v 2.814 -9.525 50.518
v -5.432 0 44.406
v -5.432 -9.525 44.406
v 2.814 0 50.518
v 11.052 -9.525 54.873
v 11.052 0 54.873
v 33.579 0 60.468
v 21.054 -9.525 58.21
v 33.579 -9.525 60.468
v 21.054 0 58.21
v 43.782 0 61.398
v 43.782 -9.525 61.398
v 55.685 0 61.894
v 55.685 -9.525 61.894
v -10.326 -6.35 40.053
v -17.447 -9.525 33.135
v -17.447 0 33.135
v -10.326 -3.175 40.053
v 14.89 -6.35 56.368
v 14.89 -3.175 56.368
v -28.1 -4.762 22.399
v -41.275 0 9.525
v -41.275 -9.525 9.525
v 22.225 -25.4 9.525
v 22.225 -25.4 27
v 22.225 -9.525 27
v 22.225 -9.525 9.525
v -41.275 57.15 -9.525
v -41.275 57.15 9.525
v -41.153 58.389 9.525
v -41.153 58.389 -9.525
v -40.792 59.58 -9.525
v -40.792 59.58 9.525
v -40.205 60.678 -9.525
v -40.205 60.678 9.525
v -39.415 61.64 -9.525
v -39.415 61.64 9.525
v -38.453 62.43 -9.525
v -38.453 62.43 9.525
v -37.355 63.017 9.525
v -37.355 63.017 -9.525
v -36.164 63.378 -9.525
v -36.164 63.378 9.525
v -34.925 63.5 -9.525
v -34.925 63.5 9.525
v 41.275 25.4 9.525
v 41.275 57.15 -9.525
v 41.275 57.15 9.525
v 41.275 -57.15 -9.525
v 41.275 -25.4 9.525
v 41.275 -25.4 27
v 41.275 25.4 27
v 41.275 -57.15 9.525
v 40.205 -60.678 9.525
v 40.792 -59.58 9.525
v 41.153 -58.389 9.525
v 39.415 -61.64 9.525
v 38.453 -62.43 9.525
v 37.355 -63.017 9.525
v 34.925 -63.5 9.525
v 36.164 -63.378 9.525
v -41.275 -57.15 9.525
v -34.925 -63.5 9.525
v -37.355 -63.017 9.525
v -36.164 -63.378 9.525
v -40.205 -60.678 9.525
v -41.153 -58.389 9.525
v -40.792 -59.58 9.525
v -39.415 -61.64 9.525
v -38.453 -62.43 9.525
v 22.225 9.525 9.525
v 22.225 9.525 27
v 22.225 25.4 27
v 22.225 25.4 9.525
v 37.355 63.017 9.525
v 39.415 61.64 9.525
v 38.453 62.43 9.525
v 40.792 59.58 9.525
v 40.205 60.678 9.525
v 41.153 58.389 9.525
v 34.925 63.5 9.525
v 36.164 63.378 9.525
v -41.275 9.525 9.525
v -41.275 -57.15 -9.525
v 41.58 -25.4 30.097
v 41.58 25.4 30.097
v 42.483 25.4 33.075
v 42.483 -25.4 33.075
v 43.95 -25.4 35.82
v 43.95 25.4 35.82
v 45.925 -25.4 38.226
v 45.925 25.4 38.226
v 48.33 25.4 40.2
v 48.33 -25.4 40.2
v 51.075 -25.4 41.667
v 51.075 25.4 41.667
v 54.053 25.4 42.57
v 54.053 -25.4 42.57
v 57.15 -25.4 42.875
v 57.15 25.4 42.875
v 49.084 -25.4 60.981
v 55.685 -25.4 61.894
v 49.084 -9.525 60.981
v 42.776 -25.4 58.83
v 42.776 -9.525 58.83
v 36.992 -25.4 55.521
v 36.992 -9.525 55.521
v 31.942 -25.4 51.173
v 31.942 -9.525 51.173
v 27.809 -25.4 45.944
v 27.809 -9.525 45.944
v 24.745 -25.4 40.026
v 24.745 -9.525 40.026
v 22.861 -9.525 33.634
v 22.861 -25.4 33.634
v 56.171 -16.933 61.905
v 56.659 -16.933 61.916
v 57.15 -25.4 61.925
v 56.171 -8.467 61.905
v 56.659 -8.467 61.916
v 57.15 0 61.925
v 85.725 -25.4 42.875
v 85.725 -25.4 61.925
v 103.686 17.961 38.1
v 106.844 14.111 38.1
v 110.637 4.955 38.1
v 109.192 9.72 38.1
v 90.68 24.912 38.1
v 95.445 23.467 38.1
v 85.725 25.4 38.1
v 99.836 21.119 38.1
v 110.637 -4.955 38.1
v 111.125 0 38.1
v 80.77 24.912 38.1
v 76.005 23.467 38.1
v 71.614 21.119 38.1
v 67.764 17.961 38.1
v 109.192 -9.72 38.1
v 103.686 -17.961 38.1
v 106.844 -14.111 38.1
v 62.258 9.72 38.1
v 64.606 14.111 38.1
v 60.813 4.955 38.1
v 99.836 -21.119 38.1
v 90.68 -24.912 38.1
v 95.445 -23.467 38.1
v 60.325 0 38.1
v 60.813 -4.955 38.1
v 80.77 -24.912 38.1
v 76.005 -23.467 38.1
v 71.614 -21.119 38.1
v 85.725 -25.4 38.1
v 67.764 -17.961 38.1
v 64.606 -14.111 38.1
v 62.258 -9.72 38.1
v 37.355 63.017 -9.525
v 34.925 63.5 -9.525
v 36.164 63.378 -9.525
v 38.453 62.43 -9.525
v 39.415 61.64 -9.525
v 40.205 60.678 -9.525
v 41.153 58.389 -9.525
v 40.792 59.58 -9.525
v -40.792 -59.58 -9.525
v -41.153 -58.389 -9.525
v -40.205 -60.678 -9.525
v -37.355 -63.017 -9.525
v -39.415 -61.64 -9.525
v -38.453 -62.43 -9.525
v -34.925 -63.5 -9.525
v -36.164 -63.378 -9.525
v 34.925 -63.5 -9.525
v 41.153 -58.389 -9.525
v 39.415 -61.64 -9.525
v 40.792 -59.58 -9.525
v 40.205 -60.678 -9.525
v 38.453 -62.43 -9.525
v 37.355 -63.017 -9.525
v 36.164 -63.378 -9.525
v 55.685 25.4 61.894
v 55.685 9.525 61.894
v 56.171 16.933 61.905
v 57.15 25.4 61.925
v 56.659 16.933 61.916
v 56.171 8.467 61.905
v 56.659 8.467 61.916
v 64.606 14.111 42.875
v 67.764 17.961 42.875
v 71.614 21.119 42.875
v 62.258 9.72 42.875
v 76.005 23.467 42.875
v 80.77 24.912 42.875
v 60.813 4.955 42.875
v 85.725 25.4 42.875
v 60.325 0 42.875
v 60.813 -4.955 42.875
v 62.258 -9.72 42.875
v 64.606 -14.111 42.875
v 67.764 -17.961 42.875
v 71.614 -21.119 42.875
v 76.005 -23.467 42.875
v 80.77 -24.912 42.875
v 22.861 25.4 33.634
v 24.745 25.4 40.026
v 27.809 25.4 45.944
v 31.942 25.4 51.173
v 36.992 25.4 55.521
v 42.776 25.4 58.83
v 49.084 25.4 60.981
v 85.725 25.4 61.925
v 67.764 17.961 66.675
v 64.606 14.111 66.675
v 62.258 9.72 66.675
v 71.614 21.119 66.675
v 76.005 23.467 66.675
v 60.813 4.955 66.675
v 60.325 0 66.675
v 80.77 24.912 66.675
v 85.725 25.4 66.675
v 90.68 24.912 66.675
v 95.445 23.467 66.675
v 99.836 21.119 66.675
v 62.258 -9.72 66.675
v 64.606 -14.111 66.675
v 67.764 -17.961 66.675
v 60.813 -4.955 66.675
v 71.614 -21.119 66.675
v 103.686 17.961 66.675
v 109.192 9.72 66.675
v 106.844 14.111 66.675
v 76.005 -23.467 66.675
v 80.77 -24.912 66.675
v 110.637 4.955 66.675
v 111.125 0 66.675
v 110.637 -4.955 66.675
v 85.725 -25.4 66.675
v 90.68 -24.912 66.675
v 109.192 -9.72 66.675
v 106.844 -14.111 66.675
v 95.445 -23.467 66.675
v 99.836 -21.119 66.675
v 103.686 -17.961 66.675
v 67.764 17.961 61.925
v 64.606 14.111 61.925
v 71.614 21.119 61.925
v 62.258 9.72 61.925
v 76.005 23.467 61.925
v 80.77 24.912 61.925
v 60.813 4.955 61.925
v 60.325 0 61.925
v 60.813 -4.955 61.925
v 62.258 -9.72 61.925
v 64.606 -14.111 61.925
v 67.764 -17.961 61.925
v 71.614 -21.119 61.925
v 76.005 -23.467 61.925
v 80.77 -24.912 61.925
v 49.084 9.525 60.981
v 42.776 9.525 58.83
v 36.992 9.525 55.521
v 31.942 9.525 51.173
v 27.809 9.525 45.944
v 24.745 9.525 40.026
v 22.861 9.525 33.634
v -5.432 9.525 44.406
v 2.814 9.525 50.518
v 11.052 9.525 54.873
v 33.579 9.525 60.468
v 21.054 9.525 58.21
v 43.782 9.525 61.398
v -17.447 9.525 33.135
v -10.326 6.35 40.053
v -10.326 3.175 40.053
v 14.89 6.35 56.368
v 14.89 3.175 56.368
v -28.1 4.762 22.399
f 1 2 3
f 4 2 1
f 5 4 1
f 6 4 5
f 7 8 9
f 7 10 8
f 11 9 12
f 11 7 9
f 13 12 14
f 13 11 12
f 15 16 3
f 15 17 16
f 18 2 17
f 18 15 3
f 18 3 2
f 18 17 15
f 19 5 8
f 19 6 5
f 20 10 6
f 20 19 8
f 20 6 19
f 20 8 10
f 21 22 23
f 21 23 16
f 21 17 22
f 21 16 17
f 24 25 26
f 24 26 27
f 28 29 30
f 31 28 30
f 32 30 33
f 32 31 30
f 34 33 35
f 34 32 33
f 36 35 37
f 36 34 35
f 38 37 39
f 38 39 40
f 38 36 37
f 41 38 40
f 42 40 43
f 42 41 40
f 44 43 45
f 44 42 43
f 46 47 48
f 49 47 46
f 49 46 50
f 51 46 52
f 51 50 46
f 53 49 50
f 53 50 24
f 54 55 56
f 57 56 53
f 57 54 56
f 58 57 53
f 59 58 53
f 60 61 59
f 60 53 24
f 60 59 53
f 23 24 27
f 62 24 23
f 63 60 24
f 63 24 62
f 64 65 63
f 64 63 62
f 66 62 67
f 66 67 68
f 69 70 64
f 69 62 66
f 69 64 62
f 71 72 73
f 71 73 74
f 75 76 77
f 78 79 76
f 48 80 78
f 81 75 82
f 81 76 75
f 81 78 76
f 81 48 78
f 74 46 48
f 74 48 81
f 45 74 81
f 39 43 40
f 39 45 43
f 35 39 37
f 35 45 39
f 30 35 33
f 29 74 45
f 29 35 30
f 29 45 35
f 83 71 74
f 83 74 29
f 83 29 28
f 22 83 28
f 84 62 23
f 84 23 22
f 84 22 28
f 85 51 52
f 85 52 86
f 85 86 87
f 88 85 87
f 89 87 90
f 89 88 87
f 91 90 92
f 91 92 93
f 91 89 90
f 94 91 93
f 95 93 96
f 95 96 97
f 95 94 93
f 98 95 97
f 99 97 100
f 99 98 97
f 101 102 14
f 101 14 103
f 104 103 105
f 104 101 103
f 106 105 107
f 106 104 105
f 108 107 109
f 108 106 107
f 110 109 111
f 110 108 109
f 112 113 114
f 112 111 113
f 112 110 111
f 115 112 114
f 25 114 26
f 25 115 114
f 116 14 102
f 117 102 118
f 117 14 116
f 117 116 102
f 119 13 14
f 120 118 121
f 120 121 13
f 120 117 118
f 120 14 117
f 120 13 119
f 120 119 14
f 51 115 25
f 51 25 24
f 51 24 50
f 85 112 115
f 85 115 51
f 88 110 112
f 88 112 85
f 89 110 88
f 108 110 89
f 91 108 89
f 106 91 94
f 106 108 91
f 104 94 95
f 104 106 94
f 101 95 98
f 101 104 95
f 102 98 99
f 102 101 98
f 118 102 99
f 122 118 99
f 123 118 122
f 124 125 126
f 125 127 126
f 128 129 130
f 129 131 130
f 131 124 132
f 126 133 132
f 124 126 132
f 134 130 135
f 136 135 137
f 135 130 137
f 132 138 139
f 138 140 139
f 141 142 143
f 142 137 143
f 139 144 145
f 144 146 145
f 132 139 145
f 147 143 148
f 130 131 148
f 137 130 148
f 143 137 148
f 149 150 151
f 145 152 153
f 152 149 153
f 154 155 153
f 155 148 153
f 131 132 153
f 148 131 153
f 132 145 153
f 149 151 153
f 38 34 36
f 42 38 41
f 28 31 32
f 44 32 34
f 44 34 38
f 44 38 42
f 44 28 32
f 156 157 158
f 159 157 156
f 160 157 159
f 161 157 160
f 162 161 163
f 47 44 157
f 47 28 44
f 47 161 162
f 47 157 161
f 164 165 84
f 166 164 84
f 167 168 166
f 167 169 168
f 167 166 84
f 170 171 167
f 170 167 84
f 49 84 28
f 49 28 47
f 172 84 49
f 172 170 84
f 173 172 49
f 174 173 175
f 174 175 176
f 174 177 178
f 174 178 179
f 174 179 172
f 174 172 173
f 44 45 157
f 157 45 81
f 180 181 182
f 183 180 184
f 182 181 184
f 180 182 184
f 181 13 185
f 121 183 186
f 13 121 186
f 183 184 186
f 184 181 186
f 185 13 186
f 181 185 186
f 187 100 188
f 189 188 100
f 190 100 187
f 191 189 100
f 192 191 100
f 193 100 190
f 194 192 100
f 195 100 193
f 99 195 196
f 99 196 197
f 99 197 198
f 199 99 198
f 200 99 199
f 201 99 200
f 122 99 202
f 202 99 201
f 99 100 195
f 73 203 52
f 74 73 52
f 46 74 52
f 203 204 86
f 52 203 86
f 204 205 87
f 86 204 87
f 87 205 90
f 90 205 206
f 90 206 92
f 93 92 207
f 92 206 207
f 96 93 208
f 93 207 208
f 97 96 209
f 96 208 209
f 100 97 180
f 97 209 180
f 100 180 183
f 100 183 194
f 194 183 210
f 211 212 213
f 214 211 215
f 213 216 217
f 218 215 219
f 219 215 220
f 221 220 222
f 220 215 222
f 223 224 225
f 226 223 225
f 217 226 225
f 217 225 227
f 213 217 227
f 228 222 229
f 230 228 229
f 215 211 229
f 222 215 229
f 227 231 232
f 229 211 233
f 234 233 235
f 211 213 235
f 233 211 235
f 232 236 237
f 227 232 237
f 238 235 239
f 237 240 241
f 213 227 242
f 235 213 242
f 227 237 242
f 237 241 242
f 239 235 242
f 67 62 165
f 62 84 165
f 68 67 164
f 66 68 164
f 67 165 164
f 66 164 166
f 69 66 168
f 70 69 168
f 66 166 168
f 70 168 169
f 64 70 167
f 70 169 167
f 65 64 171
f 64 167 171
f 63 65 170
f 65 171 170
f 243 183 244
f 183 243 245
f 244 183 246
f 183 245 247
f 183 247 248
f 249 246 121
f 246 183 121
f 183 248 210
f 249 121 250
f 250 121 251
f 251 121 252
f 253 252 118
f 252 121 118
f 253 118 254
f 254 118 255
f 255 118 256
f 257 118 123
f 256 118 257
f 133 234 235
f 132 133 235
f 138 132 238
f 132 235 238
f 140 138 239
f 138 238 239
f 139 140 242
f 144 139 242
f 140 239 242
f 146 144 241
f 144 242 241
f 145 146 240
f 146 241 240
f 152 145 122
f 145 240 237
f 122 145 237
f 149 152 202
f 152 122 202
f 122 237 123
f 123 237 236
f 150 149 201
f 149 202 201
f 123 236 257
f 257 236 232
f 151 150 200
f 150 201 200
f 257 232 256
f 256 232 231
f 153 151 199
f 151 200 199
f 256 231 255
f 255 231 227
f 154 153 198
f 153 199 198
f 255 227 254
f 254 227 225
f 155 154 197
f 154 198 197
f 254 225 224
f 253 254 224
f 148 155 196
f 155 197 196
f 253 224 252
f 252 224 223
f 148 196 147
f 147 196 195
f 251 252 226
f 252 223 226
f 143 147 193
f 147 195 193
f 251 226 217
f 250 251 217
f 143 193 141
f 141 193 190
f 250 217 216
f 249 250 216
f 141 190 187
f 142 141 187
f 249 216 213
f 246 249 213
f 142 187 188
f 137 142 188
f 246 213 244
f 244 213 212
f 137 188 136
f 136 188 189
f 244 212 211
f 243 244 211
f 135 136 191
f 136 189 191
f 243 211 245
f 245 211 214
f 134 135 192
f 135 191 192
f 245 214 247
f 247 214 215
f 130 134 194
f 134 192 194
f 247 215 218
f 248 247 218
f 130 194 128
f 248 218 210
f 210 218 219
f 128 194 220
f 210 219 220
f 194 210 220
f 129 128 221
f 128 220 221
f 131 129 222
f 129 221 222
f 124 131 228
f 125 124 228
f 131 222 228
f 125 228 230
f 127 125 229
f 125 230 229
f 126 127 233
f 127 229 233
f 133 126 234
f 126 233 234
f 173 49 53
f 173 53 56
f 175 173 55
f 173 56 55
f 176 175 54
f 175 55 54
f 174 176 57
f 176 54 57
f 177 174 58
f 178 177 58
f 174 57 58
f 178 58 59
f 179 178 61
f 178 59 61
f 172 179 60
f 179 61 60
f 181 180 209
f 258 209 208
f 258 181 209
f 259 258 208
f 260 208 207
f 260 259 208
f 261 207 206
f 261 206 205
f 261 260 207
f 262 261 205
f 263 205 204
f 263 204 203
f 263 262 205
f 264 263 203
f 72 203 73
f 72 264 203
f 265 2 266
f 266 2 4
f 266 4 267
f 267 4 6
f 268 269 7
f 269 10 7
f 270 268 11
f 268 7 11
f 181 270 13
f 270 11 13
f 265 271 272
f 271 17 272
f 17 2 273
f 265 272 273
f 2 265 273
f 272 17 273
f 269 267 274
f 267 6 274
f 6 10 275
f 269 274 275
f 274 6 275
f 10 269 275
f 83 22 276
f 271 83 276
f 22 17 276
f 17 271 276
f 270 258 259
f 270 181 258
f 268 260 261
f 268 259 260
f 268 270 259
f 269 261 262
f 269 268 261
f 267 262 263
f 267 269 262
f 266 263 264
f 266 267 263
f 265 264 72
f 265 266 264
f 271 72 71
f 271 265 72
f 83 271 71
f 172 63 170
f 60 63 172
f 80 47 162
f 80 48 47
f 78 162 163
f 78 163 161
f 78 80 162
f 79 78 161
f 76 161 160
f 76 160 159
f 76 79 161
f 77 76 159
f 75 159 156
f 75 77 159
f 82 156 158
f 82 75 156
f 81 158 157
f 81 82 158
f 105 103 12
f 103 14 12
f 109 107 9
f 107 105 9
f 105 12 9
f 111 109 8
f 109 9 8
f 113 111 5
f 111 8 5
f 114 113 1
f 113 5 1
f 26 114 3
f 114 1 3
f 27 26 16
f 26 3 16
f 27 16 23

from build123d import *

# Parameters (mm, degrees)
F1_DEPTH = 63.5
F2_DEPTH = 25.4
F3_DEPTH = 9.525
F0_W     = 25.4
F0_H     = 19.05
F4_DEPTH = 25.4
F6_R     = 6.35


# Not quite as in the source:
# - a feature names something its author has since deleted; it is built from what else it names


with BuildPart() as f1:
    # F0 (on Front) → F1 (new body, symmetric)
    with BuildSketch(Plane.XZ):
        Polygon((22.225, 9.525), (-41.275, 9.525), (-41.275, -9.525), (41.275, -9.525), (41.275, 9.525), align=None)
    extrude(amount=F1_DEPTH, both=True)

    # F0 (on Front) → F2 (join, symmetric)
    with BuildSketch(Plane.XZ):
        with BuildLine():
            Line((22.225, 27.0002), (22.225, 9.525))
            Line((22.225, 9.525), (41.275, 9.525))
            Line((41.275, 9.525), (41.275, 27.0002))
            ThreePointArc((41.275, 27.0002), (45.9246798487, 38.2255201513), (57.15, 42.8752))
            Line((57.15, 42.8752), (60.325, 42.8752))
            Line((60.325, 42.8752), (60.325, 61.9252))
            Line((60.325, 61.9252), (57.15, 61.9252))
            add(Edge.make_bspline(
                [(55.6853928695, 61.894476765), (56.1693943217, 61.9055488515), (56.6575757113, 61.9157865575), (57.15, 61.9252)],
                knots=[110.5437742754, 110.5437742754, 110.5437742754, 110.5437742754, 111.5045361635, 111.5045361635, 111.5045361635, 111.5045361635], degree=3))
            ThreePointArc((55.6853928695, 61.894476765), (31.9417966821, 51.1725418494), (22.225, 27.0002))
        make_face()
    extrude(amount=F2_DEPTH, both=True)

    # F0 (on Front) → F3 (join, symmetric)
    with BuildSketch(Plane.XZ):
        with BuildLine():
            add(Edge.make_bspline(
                [(-41.275, 9.525), (-0.3556397641, 48.3007017864), (-0.003064316, 60.620539654), (55.6853928695, 61.894476765)],
                knots=[0, 0, 0, 0, 110.5437742754, 110.5437742754, 110.5437742754, 110.5437742754], degree=3))
            Line((-41.275, 9.525), (22.225, 9.525))
            Line((22.225, 9.525), (22.225, 27.0002))
            ThreePointArc((22.225, 27.0002), (31.9417966821, 51.1725418494), (55.6853928695, 61.894476765))
        make_face()
    extrude(amount=F3_DEPTH, both=True)

    # F0 (on Front) → F4 (join, symmetric)
    with BuildSketch(Plane.XZ):
        with Locations((73.025, 52.4002)):
            Rectangle(F0_W, F0_H)
    extrude(amount=F4_DEPTH, both=True)

    # F0 (on Front) → F5 (revolve)
    with BuildSketch(Plane.XZ):
        Polygon((85.725, 66.675), (85.725, 61.9252), (85.725, 42.8752), (85.725, 38.1), (111.125, 38.1), (111.125, 66.675), align=None)
    revolve(axis=Axis((85.725, 0, 52.3875), (0, 0, -1)))

    # F6
    f6_edges = [f1.edges().sort_by_distance(p)[0] for p in [
        (41.275, -63.5, 0),
        (-41.275, -63.5, 0),
        (41.275, 63.5, 0),
        (-41.275, 63.5, 0),
    ]]
    fillet(f6_edges, radius=F6_R)


solid = f1.part
